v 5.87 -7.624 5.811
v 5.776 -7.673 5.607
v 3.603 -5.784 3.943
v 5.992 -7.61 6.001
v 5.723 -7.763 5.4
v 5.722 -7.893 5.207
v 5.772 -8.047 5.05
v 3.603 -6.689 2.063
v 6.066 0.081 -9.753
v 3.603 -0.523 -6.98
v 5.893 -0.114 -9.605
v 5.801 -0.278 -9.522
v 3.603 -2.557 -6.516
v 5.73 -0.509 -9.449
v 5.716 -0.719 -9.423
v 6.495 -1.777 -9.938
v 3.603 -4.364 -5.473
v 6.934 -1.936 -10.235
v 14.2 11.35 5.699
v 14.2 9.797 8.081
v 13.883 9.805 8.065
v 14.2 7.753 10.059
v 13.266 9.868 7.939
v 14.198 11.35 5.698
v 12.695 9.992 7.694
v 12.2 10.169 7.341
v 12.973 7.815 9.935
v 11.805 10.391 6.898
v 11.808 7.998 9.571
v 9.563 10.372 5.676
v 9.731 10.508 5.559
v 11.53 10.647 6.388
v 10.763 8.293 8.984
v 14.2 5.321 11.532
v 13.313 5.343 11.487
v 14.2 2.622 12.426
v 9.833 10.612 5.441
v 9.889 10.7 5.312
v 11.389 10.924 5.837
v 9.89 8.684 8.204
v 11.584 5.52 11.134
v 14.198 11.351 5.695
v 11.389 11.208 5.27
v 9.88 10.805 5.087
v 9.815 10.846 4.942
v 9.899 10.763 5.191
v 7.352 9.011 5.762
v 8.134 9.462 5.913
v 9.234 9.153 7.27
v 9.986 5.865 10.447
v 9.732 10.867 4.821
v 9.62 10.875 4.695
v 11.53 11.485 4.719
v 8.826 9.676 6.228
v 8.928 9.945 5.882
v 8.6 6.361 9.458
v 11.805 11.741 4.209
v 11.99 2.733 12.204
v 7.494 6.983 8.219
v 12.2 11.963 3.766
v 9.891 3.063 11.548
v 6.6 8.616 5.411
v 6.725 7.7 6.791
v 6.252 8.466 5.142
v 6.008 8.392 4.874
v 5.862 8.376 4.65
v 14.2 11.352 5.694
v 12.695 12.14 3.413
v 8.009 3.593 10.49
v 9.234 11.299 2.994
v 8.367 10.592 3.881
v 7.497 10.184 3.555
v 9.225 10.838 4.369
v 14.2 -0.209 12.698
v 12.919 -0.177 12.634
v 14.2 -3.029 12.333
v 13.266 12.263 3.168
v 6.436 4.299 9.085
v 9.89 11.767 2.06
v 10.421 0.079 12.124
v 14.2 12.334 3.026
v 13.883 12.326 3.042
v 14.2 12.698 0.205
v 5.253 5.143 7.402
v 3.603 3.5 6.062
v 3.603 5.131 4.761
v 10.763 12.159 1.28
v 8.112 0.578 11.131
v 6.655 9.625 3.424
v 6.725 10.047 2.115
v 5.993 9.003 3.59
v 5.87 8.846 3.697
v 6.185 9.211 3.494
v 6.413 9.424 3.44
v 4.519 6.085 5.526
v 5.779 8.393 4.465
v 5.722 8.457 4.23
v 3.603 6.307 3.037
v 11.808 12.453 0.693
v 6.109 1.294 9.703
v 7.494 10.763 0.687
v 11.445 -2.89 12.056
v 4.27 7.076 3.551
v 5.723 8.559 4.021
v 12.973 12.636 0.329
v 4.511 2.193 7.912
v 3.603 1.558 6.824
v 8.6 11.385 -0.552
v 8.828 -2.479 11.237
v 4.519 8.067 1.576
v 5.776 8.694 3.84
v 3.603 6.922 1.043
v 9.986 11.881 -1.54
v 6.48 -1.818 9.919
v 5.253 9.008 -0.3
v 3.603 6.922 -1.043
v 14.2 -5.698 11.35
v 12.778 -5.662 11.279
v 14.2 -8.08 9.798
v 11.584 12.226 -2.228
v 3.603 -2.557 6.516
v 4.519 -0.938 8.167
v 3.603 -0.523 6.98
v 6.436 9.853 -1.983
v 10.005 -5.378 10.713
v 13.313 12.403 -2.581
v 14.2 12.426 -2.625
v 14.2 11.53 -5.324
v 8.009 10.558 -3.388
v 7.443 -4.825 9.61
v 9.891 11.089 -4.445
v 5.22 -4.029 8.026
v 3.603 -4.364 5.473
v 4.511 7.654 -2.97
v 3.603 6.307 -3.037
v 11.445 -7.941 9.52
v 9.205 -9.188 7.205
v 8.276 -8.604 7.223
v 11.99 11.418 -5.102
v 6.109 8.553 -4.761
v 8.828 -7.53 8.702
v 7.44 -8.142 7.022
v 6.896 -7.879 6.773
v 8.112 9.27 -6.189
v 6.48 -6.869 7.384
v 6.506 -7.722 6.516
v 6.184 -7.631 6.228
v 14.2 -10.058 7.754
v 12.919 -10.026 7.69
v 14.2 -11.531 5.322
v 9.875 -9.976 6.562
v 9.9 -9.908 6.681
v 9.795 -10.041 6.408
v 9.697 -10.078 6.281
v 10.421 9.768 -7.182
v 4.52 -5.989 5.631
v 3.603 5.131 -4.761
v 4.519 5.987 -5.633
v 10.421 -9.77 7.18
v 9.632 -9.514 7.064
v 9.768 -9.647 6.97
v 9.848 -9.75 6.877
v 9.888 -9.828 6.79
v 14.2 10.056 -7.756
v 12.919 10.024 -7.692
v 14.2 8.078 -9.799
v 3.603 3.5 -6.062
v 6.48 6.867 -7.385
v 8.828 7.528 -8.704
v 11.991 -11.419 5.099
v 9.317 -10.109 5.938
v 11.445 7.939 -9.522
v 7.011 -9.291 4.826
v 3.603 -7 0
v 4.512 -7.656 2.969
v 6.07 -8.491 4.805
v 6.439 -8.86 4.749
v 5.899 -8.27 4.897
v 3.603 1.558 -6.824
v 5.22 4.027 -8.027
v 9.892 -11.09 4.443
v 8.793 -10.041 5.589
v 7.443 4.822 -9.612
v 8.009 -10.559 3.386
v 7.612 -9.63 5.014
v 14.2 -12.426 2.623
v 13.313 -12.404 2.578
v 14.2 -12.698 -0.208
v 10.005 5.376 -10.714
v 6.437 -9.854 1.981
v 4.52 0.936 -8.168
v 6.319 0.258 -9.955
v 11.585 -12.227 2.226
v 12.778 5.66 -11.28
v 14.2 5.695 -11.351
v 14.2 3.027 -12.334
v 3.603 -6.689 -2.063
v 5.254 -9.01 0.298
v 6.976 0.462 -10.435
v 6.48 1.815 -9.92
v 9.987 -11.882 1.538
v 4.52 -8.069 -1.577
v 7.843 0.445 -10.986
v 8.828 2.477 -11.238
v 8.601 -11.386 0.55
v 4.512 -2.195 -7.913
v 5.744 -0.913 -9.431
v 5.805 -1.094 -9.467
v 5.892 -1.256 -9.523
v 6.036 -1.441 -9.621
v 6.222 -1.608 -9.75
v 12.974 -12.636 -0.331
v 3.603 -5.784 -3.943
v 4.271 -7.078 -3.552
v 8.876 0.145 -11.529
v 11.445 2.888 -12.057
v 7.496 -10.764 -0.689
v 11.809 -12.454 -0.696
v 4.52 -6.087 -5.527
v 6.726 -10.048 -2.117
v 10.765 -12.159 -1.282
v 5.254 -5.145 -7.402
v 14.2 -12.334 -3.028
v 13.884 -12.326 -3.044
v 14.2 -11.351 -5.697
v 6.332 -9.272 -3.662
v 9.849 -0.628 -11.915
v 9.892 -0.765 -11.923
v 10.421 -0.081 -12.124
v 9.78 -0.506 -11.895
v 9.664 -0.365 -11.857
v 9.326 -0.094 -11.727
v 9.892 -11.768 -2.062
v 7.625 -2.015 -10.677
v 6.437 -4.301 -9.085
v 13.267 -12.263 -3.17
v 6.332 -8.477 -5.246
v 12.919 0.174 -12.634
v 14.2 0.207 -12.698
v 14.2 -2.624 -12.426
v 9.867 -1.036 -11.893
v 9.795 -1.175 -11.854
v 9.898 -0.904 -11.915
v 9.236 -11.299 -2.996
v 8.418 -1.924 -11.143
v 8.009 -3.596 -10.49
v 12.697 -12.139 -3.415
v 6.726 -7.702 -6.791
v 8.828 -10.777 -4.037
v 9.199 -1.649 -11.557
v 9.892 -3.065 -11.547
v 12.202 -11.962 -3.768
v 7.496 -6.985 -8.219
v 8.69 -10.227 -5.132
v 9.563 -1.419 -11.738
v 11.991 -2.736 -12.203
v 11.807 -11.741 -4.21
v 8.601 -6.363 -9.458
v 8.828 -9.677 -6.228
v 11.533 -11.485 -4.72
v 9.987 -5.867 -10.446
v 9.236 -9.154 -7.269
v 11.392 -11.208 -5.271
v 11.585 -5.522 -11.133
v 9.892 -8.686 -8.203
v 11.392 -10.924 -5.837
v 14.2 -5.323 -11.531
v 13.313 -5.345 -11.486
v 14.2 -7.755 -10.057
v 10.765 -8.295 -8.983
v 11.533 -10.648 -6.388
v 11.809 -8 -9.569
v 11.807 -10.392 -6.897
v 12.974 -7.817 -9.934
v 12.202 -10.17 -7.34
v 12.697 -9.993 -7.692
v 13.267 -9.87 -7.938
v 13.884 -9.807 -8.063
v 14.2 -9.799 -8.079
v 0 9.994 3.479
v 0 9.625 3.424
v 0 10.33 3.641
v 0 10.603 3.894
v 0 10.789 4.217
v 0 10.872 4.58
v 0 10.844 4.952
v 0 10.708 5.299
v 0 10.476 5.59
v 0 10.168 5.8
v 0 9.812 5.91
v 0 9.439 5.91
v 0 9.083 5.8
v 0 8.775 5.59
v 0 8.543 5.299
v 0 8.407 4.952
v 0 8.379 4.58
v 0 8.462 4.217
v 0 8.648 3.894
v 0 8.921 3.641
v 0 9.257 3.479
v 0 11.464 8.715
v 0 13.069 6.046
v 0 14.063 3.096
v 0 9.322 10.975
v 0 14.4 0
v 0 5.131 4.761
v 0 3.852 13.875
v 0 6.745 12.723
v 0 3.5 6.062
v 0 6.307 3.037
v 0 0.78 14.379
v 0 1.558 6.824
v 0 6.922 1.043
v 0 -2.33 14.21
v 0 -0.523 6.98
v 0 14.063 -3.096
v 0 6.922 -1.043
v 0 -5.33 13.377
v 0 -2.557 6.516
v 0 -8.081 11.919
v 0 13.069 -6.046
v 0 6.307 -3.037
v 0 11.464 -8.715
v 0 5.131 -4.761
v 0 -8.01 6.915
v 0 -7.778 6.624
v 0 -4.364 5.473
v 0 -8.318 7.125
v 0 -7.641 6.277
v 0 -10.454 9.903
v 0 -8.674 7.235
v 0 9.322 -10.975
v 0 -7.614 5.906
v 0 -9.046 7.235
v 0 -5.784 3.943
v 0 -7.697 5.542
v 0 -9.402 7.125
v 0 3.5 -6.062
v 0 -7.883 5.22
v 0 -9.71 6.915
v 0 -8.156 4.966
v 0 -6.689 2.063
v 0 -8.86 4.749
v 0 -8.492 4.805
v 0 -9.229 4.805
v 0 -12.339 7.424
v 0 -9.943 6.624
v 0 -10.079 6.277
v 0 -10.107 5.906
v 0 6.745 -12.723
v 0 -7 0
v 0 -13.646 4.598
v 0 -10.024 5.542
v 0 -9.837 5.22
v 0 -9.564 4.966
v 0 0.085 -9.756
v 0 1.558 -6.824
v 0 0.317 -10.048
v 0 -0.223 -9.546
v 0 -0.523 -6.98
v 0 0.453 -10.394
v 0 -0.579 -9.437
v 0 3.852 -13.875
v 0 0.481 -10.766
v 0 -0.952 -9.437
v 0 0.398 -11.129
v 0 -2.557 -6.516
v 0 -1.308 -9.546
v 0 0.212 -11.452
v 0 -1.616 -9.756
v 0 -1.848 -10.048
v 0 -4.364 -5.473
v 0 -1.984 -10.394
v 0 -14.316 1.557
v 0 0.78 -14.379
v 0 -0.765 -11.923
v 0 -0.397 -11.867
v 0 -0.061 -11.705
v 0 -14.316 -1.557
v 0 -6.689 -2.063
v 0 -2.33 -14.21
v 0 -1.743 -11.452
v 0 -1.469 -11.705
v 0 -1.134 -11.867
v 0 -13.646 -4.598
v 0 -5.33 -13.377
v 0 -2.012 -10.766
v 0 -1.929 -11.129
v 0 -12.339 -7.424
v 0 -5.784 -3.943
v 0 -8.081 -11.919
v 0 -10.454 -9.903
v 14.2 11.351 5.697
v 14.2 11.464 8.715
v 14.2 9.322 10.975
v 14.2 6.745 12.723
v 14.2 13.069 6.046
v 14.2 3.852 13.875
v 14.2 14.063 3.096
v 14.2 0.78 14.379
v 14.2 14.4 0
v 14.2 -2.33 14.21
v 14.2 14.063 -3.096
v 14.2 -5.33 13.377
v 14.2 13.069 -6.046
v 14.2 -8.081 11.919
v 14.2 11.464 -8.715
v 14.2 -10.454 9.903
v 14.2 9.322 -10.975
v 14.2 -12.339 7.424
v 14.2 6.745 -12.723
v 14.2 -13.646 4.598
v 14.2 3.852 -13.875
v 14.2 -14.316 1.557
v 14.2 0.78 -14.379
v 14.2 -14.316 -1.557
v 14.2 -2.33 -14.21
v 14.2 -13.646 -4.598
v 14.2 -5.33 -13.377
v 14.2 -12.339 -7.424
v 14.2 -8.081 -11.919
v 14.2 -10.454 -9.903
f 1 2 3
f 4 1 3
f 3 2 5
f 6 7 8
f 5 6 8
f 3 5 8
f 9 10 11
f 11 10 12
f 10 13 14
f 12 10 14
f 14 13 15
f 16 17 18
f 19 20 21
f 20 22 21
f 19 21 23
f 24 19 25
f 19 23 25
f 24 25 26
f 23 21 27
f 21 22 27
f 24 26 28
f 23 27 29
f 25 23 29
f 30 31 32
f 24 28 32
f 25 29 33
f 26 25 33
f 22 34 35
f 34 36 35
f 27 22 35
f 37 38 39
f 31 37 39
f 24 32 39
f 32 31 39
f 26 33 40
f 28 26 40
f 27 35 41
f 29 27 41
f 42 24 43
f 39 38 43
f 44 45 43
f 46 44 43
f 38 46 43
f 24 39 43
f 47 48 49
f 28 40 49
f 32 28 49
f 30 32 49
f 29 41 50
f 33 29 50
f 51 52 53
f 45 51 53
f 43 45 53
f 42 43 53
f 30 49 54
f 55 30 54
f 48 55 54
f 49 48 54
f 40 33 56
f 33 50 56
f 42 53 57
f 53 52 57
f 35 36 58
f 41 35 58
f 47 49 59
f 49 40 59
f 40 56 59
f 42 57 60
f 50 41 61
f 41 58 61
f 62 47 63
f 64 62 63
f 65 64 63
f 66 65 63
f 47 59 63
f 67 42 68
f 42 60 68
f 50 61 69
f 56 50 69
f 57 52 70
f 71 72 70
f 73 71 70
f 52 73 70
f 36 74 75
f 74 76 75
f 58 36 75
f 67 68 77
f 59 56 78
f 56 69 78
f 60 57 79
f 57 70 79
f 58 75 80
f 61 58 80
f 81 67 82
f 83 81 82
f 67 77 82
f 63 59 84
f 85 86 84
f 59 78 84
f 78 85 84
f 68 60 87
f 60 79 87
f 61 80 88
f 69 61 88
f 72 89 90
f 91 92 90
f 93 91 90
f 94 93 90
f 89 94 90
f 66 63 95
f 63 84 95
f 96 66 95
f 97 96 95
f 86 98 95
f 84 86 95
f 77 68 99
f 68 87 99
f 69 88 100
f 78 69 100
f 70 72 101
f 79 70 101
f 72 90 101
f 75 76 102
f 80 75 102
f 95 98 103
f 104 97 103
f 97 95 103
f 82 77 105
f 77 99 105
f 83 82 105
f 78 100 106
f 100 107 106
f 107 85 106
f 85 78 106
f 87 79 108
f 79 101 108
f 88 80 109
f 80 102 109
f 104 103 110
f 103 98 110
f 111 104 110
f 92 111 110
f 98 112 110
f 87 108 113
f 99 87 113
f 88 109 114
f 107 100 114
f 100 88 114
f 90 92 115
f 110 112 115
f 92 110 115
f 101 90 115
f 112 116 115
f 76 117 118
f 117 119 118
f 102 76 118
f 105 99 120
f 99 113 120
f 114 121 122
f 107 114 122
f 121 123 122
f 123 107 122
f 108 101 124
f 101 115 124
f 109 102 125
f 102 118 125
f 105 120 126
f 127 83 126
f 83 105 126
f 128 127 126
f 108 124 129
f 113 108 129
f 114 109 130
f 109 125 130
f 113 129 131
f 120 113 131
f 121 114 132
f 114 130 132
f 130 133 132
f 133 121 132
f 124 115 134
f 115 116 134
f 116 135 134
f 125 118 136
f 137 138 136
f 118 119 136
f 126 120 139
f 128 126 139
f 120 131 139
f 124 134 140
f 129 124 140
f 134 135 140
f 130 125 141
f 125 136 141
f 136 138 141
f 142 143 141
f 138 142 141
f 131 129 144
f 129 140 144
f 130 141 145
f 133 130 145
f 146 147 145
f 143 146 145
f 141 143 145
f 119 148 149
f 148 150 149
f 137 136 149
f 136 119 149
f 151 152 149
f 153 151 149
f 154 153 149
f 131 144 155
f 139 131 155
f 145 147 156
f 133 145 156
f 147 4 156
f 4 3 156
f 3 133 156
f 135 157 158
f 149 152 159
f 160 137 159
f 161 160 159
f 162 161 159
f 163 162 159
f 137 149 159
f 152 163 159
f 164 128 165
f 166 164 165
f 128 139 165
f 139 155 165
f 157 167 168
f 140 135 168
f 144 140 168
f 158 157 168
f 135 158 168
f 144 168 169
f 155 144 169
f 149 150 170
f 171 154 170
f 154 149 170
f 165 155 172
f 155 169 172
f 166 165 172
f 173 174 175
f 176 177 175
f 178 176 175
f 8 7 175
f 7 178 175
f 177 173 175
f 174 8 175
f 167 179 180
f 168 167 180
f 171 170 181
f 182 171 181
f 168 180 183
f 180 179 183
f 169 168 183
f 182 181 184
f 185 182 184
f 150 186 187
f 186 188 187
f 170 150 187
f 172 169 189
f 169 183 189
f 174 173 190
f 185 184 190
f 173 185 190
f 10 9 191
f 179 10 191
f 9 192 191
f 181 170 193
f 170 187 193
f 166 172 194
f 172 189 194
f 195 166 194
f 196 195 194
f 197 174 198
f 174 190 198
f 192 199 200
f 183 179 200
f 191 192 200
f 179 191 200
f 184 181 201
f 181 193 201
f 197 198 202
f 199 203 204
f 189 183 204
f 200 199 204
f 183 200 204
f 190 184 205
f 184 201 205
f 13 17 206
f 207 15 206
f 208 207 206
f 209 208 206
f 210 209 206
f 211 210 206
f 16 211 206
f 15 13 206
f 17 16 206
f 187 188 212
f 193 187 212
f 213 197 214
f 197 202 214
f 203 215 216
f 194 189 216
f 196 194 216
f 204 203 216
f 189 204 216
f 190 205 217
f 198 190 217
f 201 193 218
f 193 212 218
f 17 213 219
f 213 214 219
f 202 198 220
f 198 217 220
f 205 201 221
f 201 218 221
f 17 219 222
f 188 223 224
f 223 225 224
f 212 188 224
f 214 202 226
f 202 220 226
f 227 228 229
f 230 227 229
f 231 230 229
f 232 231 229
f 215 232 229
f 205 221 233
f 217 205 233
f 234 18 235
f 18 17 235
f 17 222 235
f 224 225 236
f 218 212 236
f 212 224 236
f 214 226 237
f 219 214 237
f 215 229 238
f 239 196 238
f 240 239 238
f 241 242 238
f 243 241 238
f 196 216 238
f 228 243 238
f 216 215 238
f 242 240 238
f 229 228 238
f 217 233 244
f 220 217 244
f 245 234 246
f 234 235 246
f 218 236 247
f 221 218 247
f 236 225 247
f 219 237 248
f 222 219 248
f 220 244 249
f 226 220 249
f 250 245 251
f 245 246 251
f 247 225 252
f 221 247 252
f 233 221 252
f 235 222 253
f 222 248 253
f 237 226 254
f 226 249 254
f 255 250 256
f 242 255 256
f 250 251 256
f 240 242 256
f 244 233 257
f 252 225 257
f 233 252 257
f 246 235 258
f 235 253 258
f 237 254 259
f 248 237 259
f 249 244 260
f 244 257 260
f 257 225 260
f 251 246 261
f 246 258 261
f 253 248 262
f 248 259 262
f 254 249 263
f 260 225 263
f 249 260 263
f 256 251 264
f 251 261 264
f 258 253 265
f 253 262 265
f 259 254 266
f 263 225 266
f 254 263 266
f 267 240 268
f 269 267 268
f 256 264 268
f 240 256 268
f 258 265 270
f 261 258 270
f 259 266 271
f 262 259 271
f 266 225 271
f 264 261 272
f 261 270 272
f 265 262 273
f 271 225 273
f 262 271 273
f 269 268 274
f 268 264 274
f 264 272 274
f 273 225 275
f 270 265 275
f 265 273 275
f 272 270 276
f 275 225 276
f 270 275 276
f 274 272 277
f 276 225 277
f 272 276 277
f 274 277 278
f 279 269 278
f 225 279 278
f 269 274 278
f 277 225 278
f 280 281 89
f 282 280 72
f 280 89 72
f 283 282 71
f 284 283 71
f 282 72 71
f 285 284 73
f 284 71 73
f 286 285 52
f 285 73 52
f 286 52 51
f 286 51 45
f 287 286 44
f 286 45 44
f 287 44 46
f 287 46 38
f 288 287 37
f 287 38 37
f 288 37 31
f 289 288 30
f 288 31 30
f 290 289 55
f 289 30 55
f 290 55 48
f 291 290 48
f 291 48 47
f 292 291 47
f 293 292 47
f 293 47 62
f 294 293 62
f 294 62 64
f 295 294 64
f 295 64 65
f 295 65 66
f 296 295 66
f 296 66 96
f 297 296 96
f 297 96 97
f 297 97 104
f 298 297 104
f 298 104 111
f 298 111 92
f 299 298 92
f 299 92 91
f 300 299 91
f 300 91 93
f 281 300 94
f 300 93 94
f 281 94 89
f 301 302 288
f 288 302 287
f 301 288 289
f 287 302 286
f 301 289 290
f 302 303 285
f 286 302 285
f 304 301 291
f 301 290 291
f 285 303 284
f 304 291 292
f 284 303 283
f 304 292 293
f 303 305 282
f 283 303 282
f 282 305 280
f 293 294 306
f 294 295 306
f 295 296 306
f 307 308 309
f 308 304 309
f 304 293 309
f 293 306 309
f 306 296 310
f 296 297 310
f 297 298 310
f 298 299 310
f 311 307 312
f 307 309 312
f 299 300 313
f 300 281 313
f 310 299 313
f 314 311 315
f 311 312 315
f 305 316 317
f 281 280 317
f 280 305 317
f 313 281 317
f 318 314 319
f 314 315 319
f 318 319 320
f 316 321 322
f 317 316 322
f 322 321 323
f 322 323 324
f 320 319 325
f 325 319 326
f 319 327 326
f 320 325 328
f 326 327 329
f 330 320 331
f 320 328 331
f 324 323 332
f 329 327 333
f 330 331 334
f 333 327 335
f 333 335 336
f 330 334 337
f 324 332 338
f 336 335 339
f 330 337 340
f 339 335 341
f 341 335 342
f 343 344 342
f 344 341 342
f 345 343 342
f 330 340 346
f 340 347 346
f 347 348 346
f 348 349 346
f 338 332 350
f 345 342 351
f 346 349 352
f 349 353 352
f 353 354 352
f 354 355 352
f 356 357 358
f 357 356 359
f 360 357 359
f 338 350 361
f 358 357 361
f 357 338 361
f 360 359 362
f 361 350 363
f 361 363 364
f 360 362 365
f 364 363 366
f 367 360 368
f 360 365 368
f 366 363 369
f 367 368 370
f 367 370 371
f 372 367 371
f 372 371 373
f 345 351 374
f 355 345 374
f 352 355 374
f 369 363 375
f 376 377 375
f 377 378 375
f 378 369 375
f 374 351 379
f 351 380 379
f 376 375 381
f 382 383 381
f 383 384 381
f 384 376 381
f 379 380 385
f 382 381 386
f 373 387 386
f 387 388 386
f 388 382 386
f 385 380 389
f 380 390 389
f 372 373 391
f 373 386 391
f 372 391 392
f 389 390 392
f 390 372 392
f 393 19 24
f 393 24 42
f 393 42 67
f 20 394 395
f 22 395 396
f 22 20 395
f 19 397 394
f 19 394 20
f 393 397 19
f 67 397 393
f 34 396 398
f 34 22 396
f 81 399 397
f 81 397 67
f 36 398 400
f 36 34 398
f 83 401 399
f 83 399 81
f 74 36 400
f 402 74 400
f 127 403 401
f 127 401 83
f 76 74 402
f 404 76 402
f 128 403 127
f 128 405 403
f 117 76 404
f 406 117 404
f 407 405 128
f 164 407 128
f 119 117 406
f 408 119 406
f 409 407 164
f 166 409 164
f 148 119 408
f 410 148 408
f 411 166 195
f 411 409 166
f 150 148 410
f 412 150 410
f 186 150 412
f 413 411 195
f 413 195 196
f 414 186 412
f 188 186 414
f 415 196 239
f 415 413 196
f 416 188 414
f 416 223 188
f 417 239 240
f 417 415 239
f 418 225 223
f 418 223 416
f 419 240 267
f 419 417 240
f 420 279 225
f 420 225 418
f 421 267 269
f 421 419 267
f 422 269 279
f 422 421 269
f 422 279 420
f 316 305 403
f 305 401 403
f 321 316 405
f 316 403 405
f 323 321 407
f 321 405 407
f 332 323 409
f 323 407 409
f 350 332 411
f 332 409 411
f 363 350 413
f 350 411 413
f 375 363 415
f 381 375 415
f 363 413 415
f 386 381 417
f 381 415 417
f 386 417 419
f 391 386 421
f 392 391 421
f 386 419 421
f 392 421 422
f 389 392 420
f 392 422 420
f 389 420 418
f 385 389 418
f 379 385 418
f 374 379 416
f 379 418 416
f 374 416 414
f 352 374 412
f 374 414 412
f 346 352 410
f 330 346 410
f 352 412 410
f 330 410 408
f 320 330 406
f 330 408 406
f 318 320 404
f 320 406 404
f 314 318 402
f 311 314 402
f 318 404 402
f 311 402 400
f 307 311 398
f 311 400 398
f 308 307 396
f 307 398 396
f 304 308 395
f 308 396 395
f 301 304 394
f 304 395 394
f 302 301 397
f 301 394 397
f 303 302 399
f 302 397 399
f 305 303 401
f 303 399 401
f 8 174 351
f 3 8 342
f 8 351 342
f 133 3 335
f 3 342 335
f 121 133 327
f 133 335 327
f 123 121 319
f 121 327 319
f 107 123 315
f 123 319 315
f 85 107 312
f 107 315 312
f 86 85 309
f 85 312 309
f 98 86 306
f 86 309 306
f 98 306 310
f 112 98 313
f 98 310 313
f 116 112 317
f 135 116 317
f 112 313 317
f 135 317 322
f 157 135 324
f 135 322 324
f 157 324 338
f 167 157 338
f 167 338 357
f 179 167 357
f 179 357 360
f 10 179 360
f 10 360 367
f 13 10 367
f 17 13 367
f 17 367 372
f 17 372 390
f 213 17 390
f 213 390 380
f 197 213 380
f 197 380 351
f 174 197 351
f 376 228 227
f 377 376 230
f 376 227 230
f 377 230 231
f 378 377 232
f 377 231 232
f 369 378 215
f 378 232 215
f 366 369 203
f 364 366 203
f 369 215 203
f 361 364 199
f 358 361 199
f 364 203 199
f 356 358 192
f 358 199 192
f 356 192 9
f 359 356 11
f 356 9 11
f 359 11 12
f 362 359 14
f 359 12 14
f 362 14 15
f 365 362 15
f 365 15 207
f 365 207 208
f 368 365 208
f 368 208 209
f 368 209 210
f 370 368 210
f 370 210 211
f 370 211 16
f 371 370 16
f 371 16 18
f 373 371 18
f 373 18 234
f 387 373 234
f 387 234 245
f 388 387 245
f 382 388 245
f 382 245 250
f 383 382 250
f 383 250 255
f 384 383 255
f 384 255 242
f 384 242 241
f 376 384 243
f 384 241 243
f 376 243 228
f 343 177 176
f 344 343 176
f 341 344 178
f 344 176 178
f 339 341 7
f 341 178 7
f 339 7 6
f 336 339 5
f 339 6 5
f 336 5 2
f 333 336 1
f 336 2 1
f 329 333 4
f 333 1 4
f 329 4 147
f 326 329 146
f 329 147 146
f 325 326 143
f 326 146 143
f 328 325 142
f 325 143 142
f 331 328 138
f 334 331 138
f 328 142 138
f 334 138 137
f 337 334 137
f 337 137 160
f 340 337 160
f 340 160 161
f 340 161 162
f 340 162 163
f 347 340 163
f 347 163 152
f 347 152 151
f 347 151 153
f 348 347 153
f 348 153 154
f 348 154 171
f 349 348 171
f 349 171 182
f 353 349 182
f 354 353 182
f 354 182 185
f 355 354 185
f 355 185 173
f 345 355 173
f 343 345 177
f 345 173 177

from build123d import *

# Parameters (mm, degrees)
ESQUISSE1_W                             = 14.2
ESQUISSE1_H                             = 14.4
ENL_VEMENT_DE_MATI_RE_R_VOLUTION2_ANGLE = 180
ENL_V_MAT_EXTRU_1_REACH                 = 26.827
ENL_V_MAT_EXTRU_1_END_RADIUS            = 12.7
ESQUISSE5_R                             = 7
DIAM_TRE_DU_PER_AGE_2_5_2_5_1_D         = 2.5


with BuildPart() as part:
    # Esquisse1 → Révolution1 (revolve)
    with BuildSketch(Plane.XY):
        with Locations((7.1, 7.2)):
            Rectangle(ESQUISSE1_W, ESQUISSE1_H)
    revolve(axis=Axis((14.2, 0, 0), (-1, 0, 0)))

    # Esquisse4 → Enlèvement de matière-Révolution2 (revolve, cut)
    with BuildSketch(Plane(origin=(14.2, 0, 0), x_dir=(0, 0, -1), z_dir=(1, 0, 0))):
        with BuildLine():
            Line((5.69655858, -11.350736555), (-5.69655858, 11.350736555))
            Line((-5.69655858, 11.350736555), (-5.698821877, 11.349600399))
            ThreePointArc((-5.698821877, 11.349600399), (-11.350168533, -5.697690257), (5.69655858, -11.350736555))
        make_face()
    revolve(axis=Axis((14.2, -12.018635625, -6.031754993), (0, -0.8937587838633266, -0.4485479196999441)), revolution_arc=ENL_VEMENT_DE_MATI_RE_R_VOLUTION2_ANGLE, mode=Mode.SUBTRACT)

    # Enlèv. mat.-Extru.1: up to this sphere (the profile starts outside it)
    enl_v_mat_extru_1_end = Location((14.2, 0, 0)) * Sphere(ENL_V_MAT_EXTRU_1_END_RADIUS, mode=Mode.PRIVATE)
    # Esquisse5 → Enlèv. mat.-Extru.1 (cut, up to the surface)
    with BuildSketch(Plane.ZY, mode=Mode.PRIVATE) as enl_v_mat_extru_1_sk1:
        with Locations(Location((0, 0, 0), (0, 0, 270))):
            Circle(ESQUISSE5_R)
    enl_v_mat_extru_1_tool1 = extrude(enl_v_mat_extru_1_sk1.sketch, amount=-ENL_V_MAT_EXTRU_1_REACH, mode=Mode.PRIVATE) - enl_v_mat_extru_1_end
    add(enl_v_mat_extru_1_tool1.solids().sort_by_distance((0, 0, 0))[0], mode=Mode.SUBTRACT)

    # Diamètre du perçage Ø2.5 (2.5)1 (through all)
    with Locations(Plane.ZY):
        with Locations((-10.672597122, -0.765291239), (5.999060215, -8.860094612), (4.673536907, 9.625385851)):
            Hole(DIAM_TRE_DU_PER_AGE_2_5_2_5_1_D / 2)


solid = part.part
